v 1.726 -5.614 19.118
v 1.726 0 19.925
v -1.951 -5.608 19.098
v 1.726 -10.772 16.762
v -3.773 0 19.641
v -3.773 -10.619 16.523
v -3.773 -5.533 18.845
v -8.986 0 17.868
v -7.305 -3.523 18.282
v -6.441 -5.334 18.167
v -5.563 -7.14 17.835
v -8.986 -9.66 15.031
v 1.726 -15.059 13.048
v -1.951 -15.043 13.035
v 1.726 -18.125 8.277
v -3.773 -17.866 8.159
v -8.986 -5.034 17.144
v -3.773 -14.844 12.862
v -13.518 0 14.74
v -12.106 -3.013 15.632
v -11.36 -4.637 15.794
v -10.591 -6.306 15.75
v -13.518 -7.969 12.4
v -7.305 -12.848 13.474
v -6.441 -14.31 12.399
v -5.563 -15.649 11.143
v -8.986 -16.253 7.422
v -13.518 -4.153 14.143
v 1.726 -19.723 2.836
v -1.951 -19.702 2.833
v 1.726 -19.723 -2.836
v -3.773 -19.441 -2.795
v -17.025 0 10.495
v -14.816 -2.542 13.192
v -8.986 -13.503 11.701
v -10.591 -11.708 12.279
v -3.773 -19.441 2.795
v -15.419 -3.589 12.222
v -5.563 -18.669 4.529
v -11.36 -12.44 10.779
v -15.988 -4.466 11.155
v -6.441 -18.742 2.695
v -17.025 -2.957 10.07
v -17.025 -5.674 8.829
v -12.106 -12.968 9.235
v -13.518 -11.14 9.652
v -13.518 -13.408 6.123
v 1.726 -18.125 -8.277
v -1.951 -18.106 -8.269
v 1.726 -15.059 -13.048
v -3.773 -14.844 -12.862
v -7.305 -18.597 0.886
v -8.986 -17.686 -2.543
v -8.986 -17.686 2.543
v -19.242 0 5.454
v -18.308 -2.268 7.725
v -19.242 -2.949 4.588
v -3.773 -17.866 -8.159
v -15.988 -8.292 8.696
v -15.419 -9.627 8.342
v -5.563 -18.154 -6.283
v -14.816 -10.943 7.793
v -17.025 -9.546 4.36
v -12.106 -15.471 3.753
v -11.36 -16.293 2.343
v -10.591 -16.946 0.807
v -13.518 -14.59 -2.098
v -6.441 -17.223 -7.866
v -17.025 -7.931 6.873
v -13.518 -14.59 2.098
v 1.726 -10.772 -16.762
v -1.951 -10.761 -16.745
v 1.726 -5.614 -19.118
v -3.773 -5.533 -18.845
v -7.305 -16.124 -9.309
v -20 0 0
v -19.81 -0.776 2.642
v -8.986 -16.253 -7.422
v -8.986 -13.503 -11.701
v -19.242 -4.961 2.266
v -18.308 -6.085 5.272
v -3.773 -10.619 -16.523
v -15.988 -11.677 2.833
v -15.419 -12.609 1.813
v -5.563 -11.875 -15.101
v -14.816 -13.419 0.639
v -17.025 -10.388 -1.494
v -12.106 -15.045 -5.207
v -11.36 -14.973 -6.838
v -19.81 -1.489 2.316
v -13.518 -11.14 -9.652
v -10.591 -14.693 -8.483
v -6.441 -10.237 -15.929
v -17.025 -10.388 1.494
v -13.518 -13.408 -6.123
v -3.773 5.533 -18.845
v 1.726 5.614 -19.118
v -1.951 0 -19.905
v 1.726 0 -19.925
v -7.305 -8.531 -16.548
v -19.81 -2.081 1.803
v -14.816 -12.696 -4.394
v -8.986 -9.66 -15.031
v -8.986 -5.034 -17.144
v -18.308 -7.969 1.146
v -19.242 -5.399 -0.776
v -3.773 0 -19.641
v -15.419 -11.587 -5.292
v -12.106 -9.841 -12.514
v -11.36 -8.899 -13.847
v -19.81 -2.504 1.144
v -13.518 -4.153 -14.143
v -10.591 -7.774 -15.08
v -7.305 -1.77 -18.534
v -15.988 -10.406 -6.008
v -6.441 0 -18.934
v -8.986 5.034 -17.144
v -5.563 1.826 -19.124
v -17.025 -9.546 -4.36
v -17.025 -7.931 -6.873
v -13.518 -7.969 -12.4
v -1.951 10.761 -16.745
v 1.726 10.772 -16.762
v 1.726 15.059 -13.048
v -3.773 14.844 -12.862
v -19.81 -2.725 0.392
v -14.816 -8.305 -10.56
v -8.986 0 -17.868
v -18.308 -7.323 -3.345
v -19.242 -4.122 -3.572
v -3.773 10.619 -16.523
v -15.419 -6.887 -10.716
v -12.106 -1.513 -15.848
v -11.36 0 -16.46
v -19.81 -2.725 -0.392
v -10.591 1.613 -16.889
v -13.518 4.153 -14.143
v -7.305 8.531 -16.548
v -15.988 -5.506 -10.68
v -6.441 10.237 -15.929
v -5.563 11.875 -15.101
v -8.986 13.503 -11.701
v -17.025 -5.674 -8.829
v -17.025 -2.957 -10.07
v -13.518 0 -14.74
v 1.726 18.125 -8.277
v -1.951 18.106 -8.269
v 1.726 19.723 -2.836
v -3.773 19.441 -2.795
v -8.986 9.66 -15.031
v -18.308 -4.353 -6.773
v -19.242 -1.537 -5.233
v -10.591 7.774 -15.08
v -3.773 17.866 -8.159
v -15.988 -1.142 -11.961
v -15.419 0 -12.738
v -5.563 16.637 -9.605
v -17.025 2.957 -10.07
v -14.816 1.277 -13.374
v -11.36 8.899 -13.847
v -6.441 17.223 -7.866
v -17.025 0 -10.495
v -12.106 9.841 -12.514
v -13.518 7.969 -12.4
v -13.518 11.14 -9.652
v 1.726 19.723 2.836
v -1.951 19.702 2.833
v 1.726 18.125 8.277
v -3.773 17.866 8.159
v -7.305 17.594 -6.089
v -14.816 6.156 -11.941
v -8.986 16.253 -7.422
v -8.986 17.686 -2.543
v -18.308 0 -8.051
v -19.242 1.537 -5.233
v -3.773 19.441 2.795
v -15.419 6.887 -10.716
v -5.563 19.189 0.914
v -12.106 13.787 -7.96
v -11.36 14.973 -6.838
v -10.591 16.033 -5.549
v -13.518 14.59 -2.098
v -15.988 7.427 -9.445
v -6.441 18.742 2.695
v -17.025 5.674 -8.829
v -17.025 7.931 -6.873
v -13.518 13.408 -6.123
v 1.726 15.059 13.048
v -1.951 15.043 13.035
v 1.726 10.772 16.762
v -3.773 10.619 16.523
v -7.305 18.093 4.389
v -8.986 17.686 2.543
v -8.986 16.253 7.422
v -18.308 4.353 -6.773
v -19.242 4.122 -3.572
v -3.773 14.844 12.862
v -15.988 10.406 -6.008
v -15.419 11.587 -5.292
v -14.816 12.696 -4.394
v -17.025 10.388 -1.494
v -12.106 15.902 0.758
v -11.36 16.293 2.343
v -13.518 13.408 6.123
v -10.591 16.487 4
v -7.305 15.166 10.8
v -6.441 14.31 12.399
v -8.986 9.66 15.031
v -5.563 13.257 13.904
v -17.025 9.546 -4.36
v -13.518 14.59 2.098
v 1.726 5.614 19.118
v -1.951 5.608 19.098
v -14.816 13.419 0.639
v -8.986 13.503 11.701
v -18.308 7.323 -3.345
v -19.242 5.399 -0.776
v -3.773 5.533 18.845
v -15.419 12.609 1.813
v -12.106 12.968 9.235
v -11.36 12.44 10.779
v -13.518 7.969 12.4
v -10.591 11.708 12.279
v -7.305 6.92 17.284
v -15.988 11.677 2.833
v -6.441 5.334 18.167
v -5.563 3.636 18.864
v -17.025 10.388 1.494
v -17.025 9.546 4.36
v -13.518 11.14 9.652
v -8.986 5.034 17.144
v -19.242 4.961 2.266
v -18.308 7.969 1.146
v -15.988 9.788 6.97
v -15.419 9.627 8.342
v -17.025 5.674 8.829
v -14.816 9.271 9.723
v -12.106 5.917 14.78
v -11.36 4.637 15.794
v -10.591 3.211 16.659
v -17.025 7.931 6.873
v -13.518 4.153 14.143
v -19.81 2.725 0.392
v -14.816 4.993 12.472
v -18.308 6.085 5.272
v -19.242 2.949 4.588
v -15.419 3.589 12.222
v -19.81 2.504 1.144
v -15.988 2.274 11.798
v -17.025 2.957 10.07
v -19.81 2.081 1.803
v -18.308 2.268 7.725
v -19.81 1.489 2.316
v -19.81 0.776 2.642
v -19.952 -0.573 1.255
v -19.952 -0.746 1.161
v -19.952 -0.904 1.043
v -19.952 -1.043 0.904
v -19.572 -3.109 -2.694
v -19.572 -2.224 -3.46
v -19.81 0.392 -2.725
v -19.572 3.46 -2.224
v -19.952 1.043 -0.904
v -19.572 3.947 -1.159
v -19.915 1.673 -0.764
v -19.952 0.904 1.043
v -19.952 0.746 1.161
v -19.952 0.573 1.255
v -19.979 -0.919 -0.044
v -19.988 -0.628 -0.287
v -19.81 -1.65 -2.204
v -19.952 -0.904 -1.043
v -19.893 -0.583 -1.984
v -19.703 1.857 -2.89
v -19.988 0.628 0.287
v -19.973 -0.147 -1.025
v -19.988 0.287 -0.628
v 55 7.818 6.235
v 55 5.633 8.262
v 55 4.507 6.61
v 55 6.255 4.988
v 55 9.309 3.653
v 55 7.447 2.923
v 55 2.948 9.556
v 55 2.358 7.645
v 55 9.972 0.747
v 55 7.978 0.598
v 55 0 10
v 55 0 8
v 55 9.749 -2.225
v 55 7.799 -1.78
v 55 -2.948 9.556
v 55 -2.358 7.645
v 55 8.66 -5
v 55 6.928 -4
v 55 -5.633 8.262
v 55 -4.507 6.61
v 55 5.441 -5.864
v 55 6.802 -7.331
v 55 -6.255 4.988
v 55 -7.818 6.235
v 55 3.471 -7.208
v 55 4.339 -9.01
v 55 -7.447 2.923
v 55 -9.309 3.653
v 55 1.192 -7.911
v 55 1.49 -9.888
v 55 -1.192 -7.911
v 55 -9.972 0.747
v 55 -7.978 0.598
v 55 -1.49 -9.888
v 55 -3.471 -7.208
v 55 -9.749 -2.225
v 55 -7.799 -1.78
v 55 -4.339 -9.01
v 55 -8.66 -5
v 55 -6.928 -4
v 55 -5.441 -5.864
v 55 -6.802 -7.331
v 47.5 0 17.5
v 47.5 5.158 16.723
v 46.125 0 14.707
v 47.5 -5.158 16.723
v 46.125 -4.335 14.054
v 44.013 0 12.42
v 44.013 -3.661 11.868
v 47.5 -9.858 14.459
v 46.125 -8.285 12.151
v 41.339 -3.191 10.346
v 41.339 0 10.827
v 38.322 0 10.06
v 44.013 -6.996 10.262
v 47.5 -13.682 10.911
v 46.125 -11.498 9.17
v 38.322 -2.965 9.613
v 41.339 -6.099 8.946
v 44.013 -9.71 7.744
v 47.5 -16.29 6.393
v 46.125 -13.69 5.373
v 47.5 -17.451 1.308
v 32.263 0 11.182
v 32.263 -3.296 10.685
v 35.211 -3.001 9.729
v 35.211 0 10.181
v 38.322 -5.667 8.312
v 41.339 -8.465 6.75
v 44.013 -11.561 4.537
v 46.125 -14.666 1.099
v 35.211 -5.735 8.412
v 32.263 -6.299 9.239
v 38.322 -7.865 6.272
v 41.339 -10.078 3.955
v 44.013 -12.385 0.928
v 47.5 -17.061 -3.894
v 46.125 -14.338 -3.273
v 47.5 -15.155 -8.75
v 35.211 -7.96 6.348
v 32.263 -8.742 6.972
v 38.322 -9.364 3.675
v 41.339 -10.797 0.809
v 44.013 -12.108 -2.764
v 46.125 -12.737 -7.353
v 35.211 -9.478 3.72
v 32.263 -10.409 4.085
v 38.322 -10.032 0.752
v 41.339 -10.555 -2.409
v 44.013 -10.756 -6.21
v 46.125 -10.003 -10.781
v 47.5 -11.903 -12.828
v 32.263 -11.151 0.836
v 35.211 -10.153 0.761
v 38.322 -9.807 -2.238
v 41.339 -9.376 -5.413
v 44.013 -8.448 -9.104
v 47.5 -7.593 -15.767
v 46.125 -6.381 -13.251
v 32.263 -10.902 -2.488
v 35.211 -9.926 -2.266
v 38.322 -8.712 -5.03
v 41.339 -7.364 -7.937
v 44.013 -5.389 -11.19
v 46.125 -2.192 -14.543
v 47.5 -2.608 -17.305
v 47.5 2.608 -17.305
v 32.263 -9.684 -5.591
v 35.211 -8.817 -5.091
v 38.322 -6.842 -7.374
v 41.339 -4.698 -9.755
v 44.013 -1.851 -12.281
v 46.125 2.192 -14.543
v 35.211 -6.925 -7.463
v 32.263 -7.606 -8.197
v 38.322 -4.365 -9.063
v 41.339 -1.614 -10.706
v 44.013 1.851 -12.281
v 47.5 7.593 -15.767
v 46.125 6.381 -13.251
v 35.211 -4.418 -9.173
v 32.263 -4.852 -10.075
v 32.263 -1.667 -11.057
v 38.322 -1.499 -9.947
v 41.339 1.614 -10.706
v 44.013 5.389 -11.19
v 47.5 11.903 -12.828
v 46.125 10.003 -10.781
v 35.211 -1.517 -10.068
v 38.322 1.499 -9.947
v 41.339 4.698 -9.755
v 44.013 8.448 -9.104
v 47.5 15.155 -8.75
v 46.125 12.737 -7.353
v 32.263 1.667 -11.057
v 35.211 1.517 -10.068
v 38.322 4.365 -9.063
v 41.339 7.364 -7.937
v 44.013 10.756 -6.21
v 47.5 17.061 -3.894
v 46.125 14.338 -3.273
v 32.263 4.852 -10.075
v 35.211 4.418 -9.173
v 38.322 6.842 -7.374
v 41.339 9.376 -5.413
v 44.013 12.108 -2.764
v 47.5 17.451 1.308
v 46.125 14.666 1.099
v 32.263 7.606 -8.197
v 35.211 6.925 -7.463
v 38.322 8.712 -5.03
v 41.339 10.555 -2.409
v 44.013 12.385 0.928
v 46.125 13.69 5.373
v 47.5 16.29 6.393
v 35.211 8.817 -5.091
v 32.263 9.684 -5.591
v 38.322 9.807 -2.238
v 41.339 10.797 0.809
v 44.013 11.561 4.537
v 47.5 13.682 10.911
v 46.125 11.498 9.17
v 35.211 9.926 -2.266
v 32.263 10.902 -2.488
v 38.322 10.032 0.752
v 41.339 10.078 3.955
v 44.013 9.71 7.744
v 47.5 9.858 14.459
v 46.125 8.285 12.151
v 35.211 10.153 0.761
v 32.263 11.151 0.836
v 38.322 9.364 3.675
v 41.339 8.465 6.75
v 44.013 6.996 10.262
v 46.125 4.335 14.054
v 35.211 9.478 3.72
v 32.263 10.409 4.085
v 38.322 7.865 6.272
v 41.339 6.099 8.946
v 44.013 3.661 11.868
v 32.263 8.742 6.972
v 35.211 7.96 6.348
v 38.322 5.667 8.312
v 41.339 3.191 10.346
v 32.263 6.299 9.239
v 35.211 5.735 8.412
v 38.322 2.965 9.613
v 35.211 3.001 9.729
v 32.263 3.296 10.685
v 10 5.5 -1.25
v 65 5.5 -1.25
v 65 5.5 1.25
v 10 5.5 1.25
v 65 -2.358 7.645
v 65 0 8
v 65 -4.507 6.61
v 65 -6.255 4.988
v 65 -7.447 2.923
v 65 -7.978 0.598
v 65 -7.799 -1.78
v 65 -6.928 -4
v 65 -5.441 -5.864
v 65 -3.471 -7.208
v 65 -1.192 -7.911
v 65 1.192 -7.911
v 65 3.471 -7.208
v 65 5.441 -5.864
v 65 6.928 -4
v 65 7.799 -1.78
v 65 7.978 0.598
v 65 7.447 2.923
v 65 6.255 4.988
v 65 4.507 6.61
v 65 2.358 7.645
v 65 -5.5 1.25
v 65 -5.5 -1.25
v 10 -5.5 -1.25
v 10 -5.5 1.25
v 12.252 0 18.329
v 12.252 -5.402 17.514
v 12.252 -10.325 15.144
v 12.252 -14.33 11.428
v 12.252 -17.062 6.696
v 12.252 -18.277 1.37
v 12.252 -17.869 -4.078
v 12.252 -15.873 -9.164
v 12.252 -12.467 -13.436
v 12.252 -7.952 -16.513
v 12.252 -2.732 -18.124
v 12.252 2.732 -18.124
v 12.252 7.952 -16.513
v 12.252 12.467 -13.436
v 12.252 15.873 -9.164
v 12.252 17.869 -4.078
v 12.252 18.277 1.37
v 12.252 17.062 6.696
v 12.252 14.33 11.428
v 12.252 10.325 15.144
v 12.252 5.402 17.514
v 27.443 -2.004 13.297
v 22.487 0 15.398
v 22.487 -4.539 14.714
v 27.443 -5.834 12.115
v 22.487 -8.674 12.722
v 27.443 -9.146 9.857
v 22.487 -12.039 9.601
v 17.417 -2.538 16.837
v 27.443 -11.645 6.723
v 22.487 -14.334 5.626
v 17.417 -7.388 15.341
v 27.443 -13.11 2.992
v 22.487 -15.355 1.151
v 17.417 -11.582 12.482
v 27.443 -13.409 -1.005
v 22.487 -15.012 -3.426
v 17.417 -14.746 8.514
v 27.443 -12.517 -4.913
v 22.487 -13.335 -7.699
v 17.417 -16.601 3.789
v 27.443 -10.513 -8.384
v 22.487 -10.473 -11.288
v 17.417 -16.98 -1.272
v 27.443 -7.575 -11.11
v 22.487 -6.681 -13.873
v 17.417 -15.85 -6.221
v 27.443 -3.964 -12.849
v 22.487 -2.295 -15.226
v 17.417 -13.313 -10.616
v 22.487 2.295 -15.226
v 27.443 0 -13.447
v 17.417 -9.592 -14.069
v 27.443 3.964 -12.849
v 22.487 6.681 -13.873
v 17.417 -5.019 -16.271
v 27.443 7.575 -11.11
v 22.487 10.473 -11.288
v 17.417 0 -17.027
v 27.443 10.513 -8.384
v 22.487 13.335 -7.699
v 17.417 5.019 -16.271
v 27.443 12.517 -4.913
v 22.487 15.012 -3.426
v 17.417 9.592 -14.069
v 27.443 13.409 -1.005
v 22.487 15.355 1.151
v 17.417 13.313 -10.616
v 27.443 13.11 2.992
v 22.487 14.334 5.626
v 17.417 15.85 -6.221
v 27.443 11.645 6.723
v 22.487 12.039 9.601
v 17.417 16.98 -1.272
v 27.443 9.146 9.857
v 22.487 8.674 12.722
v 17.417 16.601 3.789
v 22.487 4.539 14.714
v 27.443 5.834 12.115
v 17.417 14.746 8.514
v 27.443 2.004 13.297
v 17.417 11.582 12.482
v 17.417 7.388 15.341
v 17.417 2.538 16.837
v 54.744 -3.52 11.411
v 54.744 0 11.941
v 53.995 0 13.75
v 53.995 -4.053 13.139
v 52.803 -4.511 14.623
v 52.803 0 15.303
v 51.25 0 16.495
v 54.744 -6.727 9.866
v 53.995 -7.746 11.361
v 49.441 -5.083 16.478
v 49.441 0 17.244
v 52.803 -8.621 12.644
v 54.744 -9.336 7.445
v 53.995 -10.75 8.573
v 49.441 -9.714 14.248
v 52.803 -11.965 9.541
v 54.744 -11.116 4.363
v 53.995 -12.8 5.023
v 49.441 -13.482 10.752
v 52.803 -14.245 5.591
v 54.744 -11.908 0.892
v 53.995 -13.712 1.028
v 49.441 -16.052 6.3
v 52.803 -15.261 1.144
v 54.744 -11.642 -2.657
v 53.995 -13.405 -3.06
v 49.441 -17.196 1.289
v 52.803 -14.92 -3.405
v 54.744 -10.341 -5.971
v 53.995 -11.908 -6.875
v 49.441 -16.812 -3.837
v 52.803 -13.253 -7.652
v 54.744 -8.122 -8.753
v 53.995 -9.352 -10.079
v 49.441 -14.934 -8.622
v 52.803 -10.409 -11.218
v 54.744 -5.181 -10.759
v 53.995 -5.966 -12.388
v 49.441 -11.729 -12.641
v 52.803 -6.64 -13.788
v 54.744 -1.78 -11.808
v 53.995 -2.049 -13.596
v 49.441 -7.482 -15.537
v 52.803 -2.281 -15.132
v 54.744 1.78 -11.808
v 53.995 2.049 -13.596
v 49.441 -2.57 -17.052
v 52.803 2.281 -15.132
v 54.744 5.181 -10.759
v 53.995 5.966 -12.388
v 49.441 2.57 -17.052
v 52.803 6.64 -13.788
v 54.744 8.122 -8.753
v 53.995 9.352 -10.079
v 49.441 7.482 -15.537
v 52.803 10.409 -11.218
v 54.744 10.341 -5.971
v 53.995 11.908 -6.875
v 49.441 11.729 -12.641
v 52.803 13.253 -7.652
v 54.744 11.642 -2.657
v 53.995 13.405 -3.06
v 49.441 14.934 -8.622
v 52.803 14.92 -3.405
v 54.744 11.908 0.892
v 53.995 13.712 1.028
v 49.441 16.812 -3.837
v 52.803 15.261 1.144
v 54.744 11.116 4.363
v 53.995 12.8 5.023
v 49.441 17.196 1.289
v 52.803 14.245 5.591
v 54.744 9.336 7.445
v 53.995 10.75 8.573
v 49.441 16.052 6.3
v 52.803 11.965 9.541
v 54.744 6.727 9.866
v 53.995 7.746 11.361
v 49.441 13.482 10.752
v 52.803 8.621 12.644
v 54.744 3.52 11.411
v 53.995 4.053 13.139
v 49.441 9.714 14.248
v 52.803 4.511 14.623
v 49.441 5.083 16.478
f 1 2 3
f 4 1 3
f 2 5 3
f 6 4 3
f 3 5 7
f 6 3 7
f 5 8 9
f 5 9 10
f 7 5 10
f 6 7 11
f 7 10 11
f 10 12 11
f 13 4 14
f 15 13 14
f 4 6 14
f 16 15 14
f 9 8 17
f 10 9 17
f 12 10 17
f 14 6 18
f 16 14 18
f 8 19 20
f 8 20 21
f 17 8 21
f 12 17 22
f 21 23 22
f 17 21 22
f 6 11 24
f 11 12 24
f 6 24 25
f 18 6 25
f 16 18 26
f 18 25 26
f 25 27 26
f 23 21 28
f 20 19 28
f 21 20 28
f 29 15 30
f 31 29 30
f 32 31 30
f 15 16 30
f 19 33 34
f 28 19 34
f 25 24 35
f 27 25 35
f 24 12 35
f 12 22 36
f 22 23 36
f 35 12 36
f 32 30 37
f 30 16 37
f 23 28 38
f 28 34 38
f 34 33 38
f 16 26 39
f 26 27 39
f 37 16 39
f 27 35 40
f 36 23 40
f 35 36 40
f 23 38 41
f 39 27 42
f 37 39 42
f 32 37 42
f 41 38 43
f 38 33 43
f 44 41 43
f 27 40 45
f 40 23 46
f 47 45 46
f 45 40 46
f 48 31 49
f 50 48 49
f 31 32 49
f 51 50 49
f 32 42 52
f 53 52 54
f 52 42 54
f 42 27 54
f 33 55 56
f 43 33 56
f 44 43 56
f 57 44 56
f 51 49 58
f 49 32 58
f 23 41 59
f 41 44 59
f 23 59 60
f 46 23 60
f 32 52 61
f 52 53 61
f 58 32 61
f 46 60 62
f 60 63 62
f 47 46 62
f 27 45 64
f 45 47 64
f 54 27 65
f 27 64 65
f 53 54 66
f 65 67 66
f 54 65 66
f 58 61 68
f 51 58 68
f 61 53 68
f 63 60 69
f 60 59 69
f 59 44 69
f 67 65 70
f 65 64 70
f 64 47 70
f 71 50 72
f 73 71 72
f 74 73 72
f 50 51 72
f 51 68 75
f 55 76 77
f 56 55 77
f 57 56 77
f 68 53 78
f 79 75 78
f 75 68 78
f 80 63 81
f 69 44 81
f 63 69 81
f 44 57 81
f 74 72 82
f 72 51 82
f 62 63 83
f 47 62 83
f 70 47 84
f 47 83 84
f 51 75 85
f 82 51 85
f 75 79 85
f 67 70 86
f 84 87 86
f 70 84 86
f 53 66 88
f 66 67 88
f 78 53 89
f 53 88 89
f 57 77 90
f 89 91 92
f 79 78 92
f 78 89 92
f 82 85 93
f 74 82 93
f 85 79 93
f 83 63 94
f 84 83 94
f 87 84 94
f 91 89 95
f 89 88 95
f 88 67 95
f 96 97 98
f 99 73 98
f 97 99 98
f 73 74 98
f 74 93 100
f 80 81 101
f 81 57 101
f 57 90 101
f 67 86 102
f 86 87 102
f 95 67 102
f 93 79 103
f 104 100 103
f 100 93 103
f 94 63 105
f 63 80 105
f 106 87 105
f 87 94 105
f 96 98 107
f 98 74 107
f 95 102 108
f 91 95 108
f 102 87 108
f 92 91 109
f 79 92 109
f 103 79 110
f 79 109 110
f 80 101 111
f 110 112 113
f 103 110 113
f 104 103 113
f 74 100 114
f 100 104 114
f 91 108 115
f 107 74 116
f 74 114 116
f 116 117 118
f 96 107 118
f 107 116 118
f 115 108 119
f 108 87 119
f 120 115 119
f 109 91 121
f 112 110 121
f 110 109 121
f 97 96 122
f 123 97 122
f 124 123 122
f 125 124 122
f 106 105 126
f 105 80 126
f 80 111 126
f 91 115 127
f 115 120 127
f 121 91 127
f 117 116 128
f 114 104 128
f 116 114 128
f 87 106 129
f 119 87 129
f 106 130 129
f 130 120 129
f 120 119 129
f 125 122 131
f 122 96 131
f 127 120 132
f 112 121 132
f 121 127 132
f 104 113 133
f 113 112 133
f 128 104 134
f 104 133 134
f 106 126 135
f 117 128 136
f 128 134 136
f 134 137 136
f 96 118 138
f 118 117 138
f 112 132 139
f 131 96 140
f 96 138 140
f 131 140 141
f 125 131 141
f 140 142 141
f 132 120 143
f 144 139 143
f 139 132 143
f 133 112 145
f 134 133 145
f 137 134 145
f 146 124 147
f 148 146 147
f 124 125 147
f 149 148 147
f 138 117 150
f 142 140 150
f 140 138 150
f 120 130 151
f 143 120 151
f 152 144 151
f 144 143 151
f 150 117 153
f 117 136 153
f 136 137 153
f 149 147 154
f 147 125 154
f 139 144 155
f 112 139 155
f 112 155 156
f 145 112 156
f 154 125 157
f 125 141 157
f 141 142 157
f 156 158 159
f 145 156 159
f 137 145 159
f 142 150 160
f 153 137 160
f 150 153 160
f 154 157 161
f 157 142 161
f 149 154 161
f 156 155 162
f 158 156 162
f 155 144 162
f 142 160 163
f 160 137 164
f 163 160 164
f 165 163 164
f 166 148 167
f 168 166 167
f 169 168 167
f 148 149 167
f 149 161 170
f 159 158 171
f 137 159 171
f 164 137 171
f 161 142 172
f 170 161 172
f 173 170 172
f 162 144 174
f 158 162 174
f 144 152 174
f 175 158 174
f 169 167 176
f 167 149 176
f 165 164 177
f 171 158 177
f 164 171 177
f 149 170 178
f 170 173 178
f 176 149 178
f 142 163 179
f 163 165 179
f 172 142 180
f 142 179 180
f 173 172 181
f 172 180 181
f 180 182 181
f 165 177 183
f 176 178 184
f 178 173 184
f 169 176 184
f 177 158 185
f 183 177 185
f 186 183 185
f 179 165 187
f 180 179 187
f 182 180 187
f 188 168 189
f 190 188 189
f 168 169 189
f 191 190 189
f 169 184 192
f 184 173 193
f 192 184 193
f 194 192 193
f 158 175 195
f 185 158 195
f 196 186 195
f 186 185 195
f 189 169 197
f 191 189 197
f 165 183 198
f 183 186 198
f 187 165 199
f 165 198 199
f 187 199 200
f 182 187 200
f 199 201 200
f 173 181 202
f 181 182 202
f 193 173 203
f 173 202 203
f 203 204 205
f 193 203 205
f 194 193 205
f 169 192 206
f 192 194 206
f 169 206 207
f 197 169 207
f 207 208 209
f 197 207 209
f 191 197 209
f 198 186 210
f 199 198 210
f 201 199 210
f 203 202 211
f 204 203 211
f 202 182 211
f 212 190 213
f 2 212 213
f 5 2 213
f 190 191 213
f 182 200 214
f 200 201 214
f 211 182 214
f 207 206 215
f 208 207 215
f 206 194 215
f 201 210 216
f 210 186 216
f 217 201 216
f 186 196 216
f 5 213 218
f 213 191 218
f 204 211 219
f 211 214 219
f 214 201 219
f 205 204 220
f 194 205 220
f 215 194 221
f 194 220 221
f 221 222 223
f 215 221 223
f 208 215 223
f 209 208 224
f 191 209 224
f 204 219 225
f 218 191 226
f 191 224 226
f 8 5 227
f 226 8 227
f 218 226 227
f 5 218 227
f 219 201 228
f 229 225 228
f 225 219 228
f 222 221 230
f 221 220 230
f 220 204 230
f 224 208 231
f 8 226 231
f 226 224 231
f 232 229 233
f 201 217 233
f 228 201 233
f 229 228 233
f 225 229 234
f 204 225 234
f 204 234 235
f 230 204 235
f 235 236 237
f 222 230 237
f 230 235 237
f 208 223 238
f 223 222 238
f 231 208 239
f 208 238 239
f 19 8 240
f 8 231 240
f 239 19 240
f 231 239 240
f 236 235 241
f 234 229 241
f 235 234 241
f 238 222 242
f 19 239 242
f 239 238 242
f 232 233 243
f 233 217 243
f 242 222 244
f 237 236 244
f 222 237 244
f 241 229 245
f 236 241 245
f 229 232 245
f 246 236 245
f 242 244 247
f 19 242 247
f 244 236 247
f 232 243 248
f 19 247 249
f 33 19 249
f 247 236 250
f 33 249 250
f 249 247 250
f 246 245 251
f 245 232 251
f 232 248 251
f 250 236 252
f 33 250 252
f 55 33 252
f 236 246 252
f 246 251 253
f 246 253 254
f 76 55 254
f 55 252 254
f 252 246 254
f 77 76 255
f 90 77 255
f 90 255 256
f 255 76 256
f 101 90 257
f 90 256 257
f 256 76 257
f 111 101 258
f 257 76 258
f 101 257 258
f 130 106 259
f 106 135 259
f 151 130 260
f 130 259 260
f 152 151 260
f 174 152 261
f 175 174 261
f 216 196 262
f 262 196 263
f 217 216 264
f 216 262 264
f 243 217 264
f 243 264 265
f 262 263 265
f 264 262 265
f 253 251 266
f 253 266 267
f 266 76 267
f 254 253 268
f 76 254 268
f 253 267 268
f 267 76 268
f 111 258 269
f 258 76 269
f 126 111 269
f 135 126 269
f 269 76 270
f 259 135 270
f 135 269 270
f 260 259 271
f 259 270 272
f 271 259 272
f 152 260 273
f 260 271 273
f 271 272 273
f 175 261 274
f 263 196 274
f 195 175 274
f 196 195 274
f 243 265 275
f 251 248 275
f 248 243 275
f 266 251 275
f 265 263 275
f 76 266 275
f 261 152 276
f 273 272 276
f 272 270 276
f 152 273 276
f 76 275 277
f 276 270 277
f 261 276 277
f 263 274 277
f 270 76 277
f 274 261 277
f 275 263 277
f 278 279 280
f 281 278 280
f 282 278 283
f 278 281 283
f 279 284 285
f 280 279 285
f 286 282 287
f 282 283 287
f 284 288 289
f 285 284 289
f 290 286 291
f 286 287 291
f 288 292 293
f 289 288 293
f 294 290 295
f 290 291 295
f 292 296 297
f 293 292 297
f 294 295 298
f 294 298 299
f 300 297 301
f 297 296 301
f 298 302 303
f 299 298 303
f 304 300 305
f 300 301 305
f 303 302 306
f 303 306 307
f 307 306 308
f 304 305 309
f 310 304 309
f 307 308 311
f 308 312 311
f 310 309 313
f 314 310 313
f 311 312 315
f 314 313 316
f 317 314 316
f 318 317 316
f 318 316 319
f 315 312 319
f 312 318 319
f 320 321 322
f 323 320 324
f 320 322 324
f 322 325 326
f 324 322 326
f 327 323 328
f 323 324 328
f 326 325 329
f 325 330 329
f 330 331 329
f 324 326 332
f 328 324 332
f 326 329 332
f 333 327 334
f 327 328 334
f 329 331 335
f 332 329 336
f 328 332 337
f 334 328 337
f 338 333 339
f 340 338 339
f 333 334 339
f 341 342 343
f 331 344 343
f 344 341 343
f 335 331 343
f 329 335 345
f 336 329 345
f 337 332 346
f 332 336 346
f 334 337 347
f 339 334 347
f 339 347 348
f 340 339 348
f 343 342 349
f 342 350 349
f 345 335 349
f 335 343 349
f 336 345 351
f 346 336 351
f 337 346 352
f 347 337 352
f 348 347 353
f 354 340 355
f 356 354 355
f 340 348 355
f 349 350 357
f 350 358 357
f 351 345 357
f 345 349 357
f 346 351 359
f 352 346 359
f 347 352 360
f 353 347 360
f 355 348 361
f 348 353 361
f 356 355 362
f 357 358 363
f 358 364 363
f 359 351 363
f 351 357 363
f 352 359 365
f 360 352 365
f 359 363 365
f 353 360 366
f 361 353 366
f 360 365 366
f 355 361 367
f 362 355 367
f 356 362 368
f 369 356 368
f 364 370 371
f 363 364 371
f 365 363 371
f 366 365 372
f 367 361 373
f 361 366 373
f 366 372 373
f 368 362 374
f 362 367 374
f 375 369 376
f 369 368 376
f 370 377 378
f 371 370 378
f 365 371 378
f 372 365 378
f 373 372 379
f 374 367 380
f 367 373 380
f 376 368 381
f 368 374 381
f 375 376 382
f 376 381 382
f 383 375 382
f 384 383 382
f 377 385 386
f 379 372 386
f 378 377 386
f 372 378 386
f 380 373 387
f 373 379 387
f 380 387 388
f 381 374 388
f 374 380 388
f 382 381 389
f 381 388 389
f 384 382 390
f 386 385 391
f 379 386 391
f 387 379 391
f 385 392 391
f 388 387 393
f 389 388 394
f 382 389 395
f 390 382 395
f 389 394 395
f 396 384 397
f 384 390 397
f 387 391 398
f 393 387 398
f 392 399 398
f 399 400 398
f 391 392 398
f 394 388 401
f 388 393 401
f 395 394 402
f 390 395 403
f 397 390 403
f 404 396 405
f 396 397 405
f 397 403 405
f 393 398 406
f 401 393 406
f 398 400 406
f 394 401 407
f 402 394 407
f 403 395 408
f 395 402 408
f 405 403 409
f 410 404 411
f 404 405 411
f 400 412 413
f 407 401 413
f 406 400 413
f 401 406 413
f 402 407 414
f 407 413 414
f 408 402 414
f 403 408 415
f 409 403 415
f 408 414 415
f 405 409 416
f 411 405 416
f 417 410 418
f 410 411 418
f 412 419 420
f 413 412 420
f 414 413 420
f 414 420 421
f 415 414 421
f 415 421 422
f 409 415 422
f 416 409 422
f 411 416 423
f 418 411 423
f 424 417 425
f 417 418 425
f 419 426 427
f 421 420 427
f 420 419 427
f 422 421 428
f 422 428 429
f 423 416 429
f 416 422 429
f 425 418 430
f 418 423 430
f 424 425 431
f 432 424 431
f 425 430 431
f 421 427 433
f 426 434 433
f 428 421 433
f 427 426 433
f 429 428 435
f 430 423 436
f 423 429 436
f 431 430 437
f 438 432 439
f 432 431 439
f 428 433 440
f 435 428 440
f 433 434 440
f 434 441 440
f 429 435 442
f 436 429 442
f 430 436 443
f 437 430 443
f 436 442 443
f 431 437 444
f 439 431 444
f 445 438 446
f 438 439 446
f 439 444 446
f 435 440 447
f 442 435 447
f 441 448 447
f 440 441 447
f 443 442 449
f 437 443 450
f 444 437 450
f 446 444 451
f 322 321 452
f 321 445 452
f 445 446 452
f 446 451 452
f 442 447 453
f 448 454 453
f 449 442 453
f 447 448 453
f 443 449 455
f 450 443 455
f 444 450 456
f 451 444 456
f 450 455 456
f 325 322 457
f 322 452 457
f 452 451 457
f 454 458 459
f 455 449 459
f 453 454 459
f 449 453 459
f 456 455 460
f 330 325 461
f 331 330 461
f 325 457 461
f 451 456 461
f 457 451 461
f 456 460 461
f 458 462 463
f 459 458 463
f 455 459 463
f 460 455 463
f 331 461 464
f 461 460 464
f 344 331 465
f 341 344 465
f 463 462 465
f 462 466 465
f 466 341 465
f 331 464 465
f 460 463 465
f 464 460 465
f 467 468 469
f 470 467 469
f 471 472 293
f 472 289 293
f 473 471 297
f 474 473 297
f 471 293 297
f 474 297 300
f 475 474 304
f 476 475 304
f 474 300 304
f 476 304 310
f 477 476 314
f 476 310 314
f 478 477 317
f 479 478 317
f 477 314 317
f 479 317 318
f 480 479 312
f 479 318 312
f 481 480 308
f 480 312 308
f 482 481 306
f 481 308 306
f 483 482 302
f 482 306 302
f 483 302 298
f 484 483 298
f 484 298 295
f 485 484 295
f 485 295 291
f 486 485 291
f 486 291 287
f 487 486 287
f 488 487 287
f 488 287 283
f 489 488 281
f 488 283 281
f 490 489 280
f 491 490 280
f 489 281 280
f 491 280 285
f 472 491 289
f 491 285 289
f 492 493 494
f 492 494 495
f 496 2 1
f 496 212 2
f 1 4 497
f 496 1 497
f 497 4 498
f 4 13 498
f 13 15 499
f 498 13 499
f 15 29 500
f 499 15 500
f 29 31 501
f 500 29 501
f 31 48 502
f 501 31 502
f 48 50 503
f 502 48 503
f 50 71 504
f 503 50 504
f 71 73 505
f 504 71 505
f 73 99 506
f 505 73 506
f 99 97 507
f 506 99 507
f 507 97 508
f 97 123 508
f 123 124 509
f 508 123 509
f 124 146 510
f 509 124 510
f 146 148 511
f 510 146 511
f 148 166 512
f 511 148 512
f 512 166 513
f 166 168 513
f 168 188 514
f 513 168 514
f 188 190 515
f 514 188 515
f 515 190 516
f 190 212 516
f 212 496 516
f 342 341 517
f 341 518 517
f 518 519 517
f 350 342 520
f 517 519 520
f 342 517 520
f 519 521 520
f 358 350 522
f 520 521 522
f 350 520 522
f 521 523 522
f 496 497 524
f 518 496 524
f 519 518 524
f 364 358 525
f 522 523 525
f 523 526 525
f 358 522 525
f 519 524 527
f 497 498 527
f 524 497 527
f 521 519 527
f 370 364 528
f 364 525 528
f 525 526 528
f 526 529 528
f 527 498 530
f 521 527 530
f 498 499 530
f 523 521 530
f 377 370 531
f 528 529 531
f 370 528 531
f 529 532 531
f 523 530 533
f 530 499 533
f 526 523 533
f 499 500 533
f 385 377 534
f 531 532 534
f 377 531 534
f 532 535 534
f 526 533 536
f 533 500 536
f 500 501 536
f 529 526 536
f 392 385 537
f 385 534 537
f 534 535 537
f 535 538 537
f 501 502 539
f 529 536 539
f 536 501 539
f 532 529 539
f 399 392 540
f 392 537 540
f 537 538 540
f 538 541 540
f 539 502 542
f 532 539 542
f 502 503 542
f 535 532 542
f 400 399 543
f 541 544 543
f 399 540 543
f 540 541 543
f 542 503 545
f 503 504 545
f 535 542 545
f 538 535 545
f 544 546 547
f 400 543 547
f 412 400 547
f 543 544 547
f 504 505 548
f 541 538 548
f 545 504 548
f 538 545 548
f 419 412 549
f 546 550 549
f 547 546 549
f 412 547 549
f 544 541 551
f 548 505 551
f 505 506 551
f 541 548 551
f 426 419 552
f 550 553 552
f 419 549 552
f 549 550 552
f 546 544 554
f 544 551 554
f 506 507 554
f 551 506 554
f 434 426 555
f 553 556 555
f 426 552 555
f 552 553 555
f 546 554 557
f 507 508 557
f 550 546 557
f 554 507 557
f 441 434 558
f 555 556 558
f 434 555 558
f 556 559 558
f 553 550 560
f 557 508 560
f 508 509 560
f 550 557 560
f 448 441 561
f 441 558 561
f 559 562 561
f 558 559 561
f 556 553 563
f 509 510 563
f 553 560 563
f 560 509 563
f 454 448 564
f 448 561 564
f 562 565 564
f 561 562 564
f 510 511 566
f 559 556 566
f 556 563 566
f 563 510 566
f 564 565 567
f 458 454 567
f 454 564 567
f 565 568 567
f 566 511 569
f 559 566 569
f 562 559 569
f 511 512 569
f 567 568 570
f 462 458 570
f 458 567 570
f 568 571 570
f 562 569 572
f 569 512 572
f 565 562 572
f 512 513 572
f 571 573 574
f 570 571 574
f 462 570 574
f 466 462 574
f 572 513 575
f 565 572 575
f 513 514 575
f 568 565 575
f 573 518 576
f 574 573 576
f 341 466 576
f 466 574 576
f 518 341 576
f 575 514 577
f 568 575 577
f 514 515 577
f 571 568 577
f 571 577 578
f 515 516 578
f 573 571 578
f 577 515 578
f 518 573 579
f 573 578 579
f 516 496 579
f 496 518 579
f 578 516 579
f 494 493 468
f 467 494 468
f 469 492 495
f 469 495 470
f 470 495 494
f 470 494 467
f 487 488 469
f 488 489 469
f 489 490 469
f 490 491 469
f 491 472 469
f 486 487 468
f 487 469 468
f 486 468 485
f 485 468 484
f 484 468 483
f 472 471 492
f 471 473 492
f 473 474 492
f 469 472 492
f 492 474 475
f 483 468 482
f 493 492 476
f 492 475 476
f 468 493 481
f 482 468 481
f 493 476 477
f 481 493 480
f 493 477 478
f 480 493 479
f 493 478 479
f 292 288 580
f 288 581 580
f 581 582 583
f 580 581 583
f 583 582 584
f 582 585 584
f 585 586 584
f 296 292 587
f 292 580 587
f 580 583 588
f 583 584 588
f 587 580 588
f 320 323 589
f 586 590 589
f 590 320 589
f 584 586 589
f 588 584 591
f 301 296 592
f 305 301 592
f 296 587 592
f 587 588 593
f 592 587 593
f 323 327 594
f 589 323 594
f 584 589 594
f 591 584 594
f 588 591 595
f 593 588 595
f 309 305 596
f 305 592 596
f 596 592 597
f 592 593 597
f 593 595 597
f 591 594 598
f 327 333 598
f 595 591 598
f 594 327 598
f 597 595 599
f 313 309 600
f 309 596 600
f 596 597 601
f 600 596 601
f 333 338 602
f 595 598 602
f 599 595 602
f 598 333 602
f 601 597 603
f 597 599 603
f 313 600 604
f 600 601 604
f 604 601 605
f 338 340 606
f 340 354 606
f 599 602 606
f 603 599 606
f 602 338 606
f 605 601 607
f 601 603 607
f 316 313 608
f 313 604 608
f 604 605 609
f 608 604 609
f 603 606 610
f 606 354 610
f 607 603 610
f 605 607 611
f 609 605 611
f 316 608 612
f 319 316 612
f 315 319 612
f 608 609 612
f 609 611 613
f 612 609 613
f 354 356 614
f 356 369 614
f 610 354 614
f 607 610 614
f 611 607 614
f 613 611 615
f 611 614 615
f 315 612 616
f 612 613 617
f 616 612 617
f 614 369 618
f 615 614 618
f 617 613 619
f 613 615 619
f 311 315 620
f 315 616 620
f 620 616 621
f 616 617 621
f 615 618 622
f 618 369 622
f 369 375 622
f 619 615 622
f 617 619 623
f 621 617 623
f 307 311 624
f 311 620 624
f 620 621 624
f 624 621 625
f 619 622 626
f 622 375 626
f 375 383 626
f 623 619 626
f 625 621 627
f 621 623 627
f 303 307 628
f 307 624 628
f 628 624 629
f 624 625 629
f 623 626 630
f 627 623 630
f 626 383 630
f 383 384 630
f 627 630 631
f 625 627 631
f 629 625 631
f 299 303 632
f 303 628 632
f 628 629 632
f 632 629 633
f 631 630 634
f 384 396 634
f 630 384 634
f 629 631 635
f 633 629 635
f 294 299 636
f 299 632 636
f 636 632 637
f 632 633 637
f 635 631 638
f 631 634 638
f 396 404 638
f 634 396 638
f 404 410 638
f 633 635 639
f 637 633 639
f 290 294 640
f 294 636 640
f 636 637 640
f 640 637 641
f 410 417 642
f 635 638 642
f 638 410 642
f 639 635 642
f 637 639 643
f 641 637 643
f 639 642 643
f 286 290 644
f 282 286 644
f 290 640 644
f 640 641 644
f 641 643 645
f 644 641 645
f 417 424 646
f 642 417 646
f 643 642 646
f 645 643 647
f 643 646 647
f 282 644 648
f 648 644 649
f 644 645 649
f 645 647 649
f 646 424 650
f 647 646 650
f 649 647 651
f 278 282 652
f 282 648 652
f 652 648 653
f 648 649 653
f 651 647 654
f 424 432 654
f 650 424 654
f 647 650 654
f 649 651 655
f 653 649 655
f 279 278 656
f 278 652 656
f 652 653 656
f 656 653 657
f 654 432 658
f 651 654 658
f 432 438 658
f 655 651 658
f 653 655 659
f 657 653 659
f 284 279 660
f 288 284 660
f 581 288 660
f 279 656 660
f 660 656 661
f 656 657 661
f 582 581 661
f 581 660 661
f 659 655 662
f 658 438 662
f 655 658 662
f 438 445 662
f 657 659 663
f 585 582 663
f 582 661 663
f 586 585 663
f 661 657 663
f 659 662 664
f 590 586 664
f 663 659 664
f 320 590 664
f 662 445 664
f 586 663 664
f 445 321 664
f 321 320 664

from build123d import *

# Parameters (mm, degrees)
F2_W     = 11
F2_H     = 2.5
F3_DEPTH = 55


with BuildPart() as f1:
    # F0 (on Front) → F1 (revolve)
    with BuildSketch(Plane.XZ):
        with BuildLine():
            ThreePointArc((32.263173, 11.182035), (17.416574, 17.027463), (1.726048, 19.92538))
            ThreePointArc((1.726048, 19.92538), (-13.518118, 14.739759), (-20, 0))
            Line((-20, 0), (0, 0))
            Line((0, 0), (65, 0))
            Line((65, 0), (65, 8))
            Line((65, 8), (55, 8))
            Line((55, 8), (55, 10))
            ThreePointArc((55, 10), (52.803301, 15.303301), (47.5, 17.5))
            ThreePointArc((47.5, 17.5), (41.338742, 10.826844), (32.263173, 11.182035))
        make_face()
    revolve(axis=Axis((32.5, 0, 0), (1, 0, 0)))

    # F2 (on face) → F3 (cut)
    with BuildSketch(Plane.YZ.offset(65)):
        Rectangle(F2_W, F2_H)
    extrude(amount=-F3_DEPTH, mode=Mode.SUBTRACT)


solid = f1.part
